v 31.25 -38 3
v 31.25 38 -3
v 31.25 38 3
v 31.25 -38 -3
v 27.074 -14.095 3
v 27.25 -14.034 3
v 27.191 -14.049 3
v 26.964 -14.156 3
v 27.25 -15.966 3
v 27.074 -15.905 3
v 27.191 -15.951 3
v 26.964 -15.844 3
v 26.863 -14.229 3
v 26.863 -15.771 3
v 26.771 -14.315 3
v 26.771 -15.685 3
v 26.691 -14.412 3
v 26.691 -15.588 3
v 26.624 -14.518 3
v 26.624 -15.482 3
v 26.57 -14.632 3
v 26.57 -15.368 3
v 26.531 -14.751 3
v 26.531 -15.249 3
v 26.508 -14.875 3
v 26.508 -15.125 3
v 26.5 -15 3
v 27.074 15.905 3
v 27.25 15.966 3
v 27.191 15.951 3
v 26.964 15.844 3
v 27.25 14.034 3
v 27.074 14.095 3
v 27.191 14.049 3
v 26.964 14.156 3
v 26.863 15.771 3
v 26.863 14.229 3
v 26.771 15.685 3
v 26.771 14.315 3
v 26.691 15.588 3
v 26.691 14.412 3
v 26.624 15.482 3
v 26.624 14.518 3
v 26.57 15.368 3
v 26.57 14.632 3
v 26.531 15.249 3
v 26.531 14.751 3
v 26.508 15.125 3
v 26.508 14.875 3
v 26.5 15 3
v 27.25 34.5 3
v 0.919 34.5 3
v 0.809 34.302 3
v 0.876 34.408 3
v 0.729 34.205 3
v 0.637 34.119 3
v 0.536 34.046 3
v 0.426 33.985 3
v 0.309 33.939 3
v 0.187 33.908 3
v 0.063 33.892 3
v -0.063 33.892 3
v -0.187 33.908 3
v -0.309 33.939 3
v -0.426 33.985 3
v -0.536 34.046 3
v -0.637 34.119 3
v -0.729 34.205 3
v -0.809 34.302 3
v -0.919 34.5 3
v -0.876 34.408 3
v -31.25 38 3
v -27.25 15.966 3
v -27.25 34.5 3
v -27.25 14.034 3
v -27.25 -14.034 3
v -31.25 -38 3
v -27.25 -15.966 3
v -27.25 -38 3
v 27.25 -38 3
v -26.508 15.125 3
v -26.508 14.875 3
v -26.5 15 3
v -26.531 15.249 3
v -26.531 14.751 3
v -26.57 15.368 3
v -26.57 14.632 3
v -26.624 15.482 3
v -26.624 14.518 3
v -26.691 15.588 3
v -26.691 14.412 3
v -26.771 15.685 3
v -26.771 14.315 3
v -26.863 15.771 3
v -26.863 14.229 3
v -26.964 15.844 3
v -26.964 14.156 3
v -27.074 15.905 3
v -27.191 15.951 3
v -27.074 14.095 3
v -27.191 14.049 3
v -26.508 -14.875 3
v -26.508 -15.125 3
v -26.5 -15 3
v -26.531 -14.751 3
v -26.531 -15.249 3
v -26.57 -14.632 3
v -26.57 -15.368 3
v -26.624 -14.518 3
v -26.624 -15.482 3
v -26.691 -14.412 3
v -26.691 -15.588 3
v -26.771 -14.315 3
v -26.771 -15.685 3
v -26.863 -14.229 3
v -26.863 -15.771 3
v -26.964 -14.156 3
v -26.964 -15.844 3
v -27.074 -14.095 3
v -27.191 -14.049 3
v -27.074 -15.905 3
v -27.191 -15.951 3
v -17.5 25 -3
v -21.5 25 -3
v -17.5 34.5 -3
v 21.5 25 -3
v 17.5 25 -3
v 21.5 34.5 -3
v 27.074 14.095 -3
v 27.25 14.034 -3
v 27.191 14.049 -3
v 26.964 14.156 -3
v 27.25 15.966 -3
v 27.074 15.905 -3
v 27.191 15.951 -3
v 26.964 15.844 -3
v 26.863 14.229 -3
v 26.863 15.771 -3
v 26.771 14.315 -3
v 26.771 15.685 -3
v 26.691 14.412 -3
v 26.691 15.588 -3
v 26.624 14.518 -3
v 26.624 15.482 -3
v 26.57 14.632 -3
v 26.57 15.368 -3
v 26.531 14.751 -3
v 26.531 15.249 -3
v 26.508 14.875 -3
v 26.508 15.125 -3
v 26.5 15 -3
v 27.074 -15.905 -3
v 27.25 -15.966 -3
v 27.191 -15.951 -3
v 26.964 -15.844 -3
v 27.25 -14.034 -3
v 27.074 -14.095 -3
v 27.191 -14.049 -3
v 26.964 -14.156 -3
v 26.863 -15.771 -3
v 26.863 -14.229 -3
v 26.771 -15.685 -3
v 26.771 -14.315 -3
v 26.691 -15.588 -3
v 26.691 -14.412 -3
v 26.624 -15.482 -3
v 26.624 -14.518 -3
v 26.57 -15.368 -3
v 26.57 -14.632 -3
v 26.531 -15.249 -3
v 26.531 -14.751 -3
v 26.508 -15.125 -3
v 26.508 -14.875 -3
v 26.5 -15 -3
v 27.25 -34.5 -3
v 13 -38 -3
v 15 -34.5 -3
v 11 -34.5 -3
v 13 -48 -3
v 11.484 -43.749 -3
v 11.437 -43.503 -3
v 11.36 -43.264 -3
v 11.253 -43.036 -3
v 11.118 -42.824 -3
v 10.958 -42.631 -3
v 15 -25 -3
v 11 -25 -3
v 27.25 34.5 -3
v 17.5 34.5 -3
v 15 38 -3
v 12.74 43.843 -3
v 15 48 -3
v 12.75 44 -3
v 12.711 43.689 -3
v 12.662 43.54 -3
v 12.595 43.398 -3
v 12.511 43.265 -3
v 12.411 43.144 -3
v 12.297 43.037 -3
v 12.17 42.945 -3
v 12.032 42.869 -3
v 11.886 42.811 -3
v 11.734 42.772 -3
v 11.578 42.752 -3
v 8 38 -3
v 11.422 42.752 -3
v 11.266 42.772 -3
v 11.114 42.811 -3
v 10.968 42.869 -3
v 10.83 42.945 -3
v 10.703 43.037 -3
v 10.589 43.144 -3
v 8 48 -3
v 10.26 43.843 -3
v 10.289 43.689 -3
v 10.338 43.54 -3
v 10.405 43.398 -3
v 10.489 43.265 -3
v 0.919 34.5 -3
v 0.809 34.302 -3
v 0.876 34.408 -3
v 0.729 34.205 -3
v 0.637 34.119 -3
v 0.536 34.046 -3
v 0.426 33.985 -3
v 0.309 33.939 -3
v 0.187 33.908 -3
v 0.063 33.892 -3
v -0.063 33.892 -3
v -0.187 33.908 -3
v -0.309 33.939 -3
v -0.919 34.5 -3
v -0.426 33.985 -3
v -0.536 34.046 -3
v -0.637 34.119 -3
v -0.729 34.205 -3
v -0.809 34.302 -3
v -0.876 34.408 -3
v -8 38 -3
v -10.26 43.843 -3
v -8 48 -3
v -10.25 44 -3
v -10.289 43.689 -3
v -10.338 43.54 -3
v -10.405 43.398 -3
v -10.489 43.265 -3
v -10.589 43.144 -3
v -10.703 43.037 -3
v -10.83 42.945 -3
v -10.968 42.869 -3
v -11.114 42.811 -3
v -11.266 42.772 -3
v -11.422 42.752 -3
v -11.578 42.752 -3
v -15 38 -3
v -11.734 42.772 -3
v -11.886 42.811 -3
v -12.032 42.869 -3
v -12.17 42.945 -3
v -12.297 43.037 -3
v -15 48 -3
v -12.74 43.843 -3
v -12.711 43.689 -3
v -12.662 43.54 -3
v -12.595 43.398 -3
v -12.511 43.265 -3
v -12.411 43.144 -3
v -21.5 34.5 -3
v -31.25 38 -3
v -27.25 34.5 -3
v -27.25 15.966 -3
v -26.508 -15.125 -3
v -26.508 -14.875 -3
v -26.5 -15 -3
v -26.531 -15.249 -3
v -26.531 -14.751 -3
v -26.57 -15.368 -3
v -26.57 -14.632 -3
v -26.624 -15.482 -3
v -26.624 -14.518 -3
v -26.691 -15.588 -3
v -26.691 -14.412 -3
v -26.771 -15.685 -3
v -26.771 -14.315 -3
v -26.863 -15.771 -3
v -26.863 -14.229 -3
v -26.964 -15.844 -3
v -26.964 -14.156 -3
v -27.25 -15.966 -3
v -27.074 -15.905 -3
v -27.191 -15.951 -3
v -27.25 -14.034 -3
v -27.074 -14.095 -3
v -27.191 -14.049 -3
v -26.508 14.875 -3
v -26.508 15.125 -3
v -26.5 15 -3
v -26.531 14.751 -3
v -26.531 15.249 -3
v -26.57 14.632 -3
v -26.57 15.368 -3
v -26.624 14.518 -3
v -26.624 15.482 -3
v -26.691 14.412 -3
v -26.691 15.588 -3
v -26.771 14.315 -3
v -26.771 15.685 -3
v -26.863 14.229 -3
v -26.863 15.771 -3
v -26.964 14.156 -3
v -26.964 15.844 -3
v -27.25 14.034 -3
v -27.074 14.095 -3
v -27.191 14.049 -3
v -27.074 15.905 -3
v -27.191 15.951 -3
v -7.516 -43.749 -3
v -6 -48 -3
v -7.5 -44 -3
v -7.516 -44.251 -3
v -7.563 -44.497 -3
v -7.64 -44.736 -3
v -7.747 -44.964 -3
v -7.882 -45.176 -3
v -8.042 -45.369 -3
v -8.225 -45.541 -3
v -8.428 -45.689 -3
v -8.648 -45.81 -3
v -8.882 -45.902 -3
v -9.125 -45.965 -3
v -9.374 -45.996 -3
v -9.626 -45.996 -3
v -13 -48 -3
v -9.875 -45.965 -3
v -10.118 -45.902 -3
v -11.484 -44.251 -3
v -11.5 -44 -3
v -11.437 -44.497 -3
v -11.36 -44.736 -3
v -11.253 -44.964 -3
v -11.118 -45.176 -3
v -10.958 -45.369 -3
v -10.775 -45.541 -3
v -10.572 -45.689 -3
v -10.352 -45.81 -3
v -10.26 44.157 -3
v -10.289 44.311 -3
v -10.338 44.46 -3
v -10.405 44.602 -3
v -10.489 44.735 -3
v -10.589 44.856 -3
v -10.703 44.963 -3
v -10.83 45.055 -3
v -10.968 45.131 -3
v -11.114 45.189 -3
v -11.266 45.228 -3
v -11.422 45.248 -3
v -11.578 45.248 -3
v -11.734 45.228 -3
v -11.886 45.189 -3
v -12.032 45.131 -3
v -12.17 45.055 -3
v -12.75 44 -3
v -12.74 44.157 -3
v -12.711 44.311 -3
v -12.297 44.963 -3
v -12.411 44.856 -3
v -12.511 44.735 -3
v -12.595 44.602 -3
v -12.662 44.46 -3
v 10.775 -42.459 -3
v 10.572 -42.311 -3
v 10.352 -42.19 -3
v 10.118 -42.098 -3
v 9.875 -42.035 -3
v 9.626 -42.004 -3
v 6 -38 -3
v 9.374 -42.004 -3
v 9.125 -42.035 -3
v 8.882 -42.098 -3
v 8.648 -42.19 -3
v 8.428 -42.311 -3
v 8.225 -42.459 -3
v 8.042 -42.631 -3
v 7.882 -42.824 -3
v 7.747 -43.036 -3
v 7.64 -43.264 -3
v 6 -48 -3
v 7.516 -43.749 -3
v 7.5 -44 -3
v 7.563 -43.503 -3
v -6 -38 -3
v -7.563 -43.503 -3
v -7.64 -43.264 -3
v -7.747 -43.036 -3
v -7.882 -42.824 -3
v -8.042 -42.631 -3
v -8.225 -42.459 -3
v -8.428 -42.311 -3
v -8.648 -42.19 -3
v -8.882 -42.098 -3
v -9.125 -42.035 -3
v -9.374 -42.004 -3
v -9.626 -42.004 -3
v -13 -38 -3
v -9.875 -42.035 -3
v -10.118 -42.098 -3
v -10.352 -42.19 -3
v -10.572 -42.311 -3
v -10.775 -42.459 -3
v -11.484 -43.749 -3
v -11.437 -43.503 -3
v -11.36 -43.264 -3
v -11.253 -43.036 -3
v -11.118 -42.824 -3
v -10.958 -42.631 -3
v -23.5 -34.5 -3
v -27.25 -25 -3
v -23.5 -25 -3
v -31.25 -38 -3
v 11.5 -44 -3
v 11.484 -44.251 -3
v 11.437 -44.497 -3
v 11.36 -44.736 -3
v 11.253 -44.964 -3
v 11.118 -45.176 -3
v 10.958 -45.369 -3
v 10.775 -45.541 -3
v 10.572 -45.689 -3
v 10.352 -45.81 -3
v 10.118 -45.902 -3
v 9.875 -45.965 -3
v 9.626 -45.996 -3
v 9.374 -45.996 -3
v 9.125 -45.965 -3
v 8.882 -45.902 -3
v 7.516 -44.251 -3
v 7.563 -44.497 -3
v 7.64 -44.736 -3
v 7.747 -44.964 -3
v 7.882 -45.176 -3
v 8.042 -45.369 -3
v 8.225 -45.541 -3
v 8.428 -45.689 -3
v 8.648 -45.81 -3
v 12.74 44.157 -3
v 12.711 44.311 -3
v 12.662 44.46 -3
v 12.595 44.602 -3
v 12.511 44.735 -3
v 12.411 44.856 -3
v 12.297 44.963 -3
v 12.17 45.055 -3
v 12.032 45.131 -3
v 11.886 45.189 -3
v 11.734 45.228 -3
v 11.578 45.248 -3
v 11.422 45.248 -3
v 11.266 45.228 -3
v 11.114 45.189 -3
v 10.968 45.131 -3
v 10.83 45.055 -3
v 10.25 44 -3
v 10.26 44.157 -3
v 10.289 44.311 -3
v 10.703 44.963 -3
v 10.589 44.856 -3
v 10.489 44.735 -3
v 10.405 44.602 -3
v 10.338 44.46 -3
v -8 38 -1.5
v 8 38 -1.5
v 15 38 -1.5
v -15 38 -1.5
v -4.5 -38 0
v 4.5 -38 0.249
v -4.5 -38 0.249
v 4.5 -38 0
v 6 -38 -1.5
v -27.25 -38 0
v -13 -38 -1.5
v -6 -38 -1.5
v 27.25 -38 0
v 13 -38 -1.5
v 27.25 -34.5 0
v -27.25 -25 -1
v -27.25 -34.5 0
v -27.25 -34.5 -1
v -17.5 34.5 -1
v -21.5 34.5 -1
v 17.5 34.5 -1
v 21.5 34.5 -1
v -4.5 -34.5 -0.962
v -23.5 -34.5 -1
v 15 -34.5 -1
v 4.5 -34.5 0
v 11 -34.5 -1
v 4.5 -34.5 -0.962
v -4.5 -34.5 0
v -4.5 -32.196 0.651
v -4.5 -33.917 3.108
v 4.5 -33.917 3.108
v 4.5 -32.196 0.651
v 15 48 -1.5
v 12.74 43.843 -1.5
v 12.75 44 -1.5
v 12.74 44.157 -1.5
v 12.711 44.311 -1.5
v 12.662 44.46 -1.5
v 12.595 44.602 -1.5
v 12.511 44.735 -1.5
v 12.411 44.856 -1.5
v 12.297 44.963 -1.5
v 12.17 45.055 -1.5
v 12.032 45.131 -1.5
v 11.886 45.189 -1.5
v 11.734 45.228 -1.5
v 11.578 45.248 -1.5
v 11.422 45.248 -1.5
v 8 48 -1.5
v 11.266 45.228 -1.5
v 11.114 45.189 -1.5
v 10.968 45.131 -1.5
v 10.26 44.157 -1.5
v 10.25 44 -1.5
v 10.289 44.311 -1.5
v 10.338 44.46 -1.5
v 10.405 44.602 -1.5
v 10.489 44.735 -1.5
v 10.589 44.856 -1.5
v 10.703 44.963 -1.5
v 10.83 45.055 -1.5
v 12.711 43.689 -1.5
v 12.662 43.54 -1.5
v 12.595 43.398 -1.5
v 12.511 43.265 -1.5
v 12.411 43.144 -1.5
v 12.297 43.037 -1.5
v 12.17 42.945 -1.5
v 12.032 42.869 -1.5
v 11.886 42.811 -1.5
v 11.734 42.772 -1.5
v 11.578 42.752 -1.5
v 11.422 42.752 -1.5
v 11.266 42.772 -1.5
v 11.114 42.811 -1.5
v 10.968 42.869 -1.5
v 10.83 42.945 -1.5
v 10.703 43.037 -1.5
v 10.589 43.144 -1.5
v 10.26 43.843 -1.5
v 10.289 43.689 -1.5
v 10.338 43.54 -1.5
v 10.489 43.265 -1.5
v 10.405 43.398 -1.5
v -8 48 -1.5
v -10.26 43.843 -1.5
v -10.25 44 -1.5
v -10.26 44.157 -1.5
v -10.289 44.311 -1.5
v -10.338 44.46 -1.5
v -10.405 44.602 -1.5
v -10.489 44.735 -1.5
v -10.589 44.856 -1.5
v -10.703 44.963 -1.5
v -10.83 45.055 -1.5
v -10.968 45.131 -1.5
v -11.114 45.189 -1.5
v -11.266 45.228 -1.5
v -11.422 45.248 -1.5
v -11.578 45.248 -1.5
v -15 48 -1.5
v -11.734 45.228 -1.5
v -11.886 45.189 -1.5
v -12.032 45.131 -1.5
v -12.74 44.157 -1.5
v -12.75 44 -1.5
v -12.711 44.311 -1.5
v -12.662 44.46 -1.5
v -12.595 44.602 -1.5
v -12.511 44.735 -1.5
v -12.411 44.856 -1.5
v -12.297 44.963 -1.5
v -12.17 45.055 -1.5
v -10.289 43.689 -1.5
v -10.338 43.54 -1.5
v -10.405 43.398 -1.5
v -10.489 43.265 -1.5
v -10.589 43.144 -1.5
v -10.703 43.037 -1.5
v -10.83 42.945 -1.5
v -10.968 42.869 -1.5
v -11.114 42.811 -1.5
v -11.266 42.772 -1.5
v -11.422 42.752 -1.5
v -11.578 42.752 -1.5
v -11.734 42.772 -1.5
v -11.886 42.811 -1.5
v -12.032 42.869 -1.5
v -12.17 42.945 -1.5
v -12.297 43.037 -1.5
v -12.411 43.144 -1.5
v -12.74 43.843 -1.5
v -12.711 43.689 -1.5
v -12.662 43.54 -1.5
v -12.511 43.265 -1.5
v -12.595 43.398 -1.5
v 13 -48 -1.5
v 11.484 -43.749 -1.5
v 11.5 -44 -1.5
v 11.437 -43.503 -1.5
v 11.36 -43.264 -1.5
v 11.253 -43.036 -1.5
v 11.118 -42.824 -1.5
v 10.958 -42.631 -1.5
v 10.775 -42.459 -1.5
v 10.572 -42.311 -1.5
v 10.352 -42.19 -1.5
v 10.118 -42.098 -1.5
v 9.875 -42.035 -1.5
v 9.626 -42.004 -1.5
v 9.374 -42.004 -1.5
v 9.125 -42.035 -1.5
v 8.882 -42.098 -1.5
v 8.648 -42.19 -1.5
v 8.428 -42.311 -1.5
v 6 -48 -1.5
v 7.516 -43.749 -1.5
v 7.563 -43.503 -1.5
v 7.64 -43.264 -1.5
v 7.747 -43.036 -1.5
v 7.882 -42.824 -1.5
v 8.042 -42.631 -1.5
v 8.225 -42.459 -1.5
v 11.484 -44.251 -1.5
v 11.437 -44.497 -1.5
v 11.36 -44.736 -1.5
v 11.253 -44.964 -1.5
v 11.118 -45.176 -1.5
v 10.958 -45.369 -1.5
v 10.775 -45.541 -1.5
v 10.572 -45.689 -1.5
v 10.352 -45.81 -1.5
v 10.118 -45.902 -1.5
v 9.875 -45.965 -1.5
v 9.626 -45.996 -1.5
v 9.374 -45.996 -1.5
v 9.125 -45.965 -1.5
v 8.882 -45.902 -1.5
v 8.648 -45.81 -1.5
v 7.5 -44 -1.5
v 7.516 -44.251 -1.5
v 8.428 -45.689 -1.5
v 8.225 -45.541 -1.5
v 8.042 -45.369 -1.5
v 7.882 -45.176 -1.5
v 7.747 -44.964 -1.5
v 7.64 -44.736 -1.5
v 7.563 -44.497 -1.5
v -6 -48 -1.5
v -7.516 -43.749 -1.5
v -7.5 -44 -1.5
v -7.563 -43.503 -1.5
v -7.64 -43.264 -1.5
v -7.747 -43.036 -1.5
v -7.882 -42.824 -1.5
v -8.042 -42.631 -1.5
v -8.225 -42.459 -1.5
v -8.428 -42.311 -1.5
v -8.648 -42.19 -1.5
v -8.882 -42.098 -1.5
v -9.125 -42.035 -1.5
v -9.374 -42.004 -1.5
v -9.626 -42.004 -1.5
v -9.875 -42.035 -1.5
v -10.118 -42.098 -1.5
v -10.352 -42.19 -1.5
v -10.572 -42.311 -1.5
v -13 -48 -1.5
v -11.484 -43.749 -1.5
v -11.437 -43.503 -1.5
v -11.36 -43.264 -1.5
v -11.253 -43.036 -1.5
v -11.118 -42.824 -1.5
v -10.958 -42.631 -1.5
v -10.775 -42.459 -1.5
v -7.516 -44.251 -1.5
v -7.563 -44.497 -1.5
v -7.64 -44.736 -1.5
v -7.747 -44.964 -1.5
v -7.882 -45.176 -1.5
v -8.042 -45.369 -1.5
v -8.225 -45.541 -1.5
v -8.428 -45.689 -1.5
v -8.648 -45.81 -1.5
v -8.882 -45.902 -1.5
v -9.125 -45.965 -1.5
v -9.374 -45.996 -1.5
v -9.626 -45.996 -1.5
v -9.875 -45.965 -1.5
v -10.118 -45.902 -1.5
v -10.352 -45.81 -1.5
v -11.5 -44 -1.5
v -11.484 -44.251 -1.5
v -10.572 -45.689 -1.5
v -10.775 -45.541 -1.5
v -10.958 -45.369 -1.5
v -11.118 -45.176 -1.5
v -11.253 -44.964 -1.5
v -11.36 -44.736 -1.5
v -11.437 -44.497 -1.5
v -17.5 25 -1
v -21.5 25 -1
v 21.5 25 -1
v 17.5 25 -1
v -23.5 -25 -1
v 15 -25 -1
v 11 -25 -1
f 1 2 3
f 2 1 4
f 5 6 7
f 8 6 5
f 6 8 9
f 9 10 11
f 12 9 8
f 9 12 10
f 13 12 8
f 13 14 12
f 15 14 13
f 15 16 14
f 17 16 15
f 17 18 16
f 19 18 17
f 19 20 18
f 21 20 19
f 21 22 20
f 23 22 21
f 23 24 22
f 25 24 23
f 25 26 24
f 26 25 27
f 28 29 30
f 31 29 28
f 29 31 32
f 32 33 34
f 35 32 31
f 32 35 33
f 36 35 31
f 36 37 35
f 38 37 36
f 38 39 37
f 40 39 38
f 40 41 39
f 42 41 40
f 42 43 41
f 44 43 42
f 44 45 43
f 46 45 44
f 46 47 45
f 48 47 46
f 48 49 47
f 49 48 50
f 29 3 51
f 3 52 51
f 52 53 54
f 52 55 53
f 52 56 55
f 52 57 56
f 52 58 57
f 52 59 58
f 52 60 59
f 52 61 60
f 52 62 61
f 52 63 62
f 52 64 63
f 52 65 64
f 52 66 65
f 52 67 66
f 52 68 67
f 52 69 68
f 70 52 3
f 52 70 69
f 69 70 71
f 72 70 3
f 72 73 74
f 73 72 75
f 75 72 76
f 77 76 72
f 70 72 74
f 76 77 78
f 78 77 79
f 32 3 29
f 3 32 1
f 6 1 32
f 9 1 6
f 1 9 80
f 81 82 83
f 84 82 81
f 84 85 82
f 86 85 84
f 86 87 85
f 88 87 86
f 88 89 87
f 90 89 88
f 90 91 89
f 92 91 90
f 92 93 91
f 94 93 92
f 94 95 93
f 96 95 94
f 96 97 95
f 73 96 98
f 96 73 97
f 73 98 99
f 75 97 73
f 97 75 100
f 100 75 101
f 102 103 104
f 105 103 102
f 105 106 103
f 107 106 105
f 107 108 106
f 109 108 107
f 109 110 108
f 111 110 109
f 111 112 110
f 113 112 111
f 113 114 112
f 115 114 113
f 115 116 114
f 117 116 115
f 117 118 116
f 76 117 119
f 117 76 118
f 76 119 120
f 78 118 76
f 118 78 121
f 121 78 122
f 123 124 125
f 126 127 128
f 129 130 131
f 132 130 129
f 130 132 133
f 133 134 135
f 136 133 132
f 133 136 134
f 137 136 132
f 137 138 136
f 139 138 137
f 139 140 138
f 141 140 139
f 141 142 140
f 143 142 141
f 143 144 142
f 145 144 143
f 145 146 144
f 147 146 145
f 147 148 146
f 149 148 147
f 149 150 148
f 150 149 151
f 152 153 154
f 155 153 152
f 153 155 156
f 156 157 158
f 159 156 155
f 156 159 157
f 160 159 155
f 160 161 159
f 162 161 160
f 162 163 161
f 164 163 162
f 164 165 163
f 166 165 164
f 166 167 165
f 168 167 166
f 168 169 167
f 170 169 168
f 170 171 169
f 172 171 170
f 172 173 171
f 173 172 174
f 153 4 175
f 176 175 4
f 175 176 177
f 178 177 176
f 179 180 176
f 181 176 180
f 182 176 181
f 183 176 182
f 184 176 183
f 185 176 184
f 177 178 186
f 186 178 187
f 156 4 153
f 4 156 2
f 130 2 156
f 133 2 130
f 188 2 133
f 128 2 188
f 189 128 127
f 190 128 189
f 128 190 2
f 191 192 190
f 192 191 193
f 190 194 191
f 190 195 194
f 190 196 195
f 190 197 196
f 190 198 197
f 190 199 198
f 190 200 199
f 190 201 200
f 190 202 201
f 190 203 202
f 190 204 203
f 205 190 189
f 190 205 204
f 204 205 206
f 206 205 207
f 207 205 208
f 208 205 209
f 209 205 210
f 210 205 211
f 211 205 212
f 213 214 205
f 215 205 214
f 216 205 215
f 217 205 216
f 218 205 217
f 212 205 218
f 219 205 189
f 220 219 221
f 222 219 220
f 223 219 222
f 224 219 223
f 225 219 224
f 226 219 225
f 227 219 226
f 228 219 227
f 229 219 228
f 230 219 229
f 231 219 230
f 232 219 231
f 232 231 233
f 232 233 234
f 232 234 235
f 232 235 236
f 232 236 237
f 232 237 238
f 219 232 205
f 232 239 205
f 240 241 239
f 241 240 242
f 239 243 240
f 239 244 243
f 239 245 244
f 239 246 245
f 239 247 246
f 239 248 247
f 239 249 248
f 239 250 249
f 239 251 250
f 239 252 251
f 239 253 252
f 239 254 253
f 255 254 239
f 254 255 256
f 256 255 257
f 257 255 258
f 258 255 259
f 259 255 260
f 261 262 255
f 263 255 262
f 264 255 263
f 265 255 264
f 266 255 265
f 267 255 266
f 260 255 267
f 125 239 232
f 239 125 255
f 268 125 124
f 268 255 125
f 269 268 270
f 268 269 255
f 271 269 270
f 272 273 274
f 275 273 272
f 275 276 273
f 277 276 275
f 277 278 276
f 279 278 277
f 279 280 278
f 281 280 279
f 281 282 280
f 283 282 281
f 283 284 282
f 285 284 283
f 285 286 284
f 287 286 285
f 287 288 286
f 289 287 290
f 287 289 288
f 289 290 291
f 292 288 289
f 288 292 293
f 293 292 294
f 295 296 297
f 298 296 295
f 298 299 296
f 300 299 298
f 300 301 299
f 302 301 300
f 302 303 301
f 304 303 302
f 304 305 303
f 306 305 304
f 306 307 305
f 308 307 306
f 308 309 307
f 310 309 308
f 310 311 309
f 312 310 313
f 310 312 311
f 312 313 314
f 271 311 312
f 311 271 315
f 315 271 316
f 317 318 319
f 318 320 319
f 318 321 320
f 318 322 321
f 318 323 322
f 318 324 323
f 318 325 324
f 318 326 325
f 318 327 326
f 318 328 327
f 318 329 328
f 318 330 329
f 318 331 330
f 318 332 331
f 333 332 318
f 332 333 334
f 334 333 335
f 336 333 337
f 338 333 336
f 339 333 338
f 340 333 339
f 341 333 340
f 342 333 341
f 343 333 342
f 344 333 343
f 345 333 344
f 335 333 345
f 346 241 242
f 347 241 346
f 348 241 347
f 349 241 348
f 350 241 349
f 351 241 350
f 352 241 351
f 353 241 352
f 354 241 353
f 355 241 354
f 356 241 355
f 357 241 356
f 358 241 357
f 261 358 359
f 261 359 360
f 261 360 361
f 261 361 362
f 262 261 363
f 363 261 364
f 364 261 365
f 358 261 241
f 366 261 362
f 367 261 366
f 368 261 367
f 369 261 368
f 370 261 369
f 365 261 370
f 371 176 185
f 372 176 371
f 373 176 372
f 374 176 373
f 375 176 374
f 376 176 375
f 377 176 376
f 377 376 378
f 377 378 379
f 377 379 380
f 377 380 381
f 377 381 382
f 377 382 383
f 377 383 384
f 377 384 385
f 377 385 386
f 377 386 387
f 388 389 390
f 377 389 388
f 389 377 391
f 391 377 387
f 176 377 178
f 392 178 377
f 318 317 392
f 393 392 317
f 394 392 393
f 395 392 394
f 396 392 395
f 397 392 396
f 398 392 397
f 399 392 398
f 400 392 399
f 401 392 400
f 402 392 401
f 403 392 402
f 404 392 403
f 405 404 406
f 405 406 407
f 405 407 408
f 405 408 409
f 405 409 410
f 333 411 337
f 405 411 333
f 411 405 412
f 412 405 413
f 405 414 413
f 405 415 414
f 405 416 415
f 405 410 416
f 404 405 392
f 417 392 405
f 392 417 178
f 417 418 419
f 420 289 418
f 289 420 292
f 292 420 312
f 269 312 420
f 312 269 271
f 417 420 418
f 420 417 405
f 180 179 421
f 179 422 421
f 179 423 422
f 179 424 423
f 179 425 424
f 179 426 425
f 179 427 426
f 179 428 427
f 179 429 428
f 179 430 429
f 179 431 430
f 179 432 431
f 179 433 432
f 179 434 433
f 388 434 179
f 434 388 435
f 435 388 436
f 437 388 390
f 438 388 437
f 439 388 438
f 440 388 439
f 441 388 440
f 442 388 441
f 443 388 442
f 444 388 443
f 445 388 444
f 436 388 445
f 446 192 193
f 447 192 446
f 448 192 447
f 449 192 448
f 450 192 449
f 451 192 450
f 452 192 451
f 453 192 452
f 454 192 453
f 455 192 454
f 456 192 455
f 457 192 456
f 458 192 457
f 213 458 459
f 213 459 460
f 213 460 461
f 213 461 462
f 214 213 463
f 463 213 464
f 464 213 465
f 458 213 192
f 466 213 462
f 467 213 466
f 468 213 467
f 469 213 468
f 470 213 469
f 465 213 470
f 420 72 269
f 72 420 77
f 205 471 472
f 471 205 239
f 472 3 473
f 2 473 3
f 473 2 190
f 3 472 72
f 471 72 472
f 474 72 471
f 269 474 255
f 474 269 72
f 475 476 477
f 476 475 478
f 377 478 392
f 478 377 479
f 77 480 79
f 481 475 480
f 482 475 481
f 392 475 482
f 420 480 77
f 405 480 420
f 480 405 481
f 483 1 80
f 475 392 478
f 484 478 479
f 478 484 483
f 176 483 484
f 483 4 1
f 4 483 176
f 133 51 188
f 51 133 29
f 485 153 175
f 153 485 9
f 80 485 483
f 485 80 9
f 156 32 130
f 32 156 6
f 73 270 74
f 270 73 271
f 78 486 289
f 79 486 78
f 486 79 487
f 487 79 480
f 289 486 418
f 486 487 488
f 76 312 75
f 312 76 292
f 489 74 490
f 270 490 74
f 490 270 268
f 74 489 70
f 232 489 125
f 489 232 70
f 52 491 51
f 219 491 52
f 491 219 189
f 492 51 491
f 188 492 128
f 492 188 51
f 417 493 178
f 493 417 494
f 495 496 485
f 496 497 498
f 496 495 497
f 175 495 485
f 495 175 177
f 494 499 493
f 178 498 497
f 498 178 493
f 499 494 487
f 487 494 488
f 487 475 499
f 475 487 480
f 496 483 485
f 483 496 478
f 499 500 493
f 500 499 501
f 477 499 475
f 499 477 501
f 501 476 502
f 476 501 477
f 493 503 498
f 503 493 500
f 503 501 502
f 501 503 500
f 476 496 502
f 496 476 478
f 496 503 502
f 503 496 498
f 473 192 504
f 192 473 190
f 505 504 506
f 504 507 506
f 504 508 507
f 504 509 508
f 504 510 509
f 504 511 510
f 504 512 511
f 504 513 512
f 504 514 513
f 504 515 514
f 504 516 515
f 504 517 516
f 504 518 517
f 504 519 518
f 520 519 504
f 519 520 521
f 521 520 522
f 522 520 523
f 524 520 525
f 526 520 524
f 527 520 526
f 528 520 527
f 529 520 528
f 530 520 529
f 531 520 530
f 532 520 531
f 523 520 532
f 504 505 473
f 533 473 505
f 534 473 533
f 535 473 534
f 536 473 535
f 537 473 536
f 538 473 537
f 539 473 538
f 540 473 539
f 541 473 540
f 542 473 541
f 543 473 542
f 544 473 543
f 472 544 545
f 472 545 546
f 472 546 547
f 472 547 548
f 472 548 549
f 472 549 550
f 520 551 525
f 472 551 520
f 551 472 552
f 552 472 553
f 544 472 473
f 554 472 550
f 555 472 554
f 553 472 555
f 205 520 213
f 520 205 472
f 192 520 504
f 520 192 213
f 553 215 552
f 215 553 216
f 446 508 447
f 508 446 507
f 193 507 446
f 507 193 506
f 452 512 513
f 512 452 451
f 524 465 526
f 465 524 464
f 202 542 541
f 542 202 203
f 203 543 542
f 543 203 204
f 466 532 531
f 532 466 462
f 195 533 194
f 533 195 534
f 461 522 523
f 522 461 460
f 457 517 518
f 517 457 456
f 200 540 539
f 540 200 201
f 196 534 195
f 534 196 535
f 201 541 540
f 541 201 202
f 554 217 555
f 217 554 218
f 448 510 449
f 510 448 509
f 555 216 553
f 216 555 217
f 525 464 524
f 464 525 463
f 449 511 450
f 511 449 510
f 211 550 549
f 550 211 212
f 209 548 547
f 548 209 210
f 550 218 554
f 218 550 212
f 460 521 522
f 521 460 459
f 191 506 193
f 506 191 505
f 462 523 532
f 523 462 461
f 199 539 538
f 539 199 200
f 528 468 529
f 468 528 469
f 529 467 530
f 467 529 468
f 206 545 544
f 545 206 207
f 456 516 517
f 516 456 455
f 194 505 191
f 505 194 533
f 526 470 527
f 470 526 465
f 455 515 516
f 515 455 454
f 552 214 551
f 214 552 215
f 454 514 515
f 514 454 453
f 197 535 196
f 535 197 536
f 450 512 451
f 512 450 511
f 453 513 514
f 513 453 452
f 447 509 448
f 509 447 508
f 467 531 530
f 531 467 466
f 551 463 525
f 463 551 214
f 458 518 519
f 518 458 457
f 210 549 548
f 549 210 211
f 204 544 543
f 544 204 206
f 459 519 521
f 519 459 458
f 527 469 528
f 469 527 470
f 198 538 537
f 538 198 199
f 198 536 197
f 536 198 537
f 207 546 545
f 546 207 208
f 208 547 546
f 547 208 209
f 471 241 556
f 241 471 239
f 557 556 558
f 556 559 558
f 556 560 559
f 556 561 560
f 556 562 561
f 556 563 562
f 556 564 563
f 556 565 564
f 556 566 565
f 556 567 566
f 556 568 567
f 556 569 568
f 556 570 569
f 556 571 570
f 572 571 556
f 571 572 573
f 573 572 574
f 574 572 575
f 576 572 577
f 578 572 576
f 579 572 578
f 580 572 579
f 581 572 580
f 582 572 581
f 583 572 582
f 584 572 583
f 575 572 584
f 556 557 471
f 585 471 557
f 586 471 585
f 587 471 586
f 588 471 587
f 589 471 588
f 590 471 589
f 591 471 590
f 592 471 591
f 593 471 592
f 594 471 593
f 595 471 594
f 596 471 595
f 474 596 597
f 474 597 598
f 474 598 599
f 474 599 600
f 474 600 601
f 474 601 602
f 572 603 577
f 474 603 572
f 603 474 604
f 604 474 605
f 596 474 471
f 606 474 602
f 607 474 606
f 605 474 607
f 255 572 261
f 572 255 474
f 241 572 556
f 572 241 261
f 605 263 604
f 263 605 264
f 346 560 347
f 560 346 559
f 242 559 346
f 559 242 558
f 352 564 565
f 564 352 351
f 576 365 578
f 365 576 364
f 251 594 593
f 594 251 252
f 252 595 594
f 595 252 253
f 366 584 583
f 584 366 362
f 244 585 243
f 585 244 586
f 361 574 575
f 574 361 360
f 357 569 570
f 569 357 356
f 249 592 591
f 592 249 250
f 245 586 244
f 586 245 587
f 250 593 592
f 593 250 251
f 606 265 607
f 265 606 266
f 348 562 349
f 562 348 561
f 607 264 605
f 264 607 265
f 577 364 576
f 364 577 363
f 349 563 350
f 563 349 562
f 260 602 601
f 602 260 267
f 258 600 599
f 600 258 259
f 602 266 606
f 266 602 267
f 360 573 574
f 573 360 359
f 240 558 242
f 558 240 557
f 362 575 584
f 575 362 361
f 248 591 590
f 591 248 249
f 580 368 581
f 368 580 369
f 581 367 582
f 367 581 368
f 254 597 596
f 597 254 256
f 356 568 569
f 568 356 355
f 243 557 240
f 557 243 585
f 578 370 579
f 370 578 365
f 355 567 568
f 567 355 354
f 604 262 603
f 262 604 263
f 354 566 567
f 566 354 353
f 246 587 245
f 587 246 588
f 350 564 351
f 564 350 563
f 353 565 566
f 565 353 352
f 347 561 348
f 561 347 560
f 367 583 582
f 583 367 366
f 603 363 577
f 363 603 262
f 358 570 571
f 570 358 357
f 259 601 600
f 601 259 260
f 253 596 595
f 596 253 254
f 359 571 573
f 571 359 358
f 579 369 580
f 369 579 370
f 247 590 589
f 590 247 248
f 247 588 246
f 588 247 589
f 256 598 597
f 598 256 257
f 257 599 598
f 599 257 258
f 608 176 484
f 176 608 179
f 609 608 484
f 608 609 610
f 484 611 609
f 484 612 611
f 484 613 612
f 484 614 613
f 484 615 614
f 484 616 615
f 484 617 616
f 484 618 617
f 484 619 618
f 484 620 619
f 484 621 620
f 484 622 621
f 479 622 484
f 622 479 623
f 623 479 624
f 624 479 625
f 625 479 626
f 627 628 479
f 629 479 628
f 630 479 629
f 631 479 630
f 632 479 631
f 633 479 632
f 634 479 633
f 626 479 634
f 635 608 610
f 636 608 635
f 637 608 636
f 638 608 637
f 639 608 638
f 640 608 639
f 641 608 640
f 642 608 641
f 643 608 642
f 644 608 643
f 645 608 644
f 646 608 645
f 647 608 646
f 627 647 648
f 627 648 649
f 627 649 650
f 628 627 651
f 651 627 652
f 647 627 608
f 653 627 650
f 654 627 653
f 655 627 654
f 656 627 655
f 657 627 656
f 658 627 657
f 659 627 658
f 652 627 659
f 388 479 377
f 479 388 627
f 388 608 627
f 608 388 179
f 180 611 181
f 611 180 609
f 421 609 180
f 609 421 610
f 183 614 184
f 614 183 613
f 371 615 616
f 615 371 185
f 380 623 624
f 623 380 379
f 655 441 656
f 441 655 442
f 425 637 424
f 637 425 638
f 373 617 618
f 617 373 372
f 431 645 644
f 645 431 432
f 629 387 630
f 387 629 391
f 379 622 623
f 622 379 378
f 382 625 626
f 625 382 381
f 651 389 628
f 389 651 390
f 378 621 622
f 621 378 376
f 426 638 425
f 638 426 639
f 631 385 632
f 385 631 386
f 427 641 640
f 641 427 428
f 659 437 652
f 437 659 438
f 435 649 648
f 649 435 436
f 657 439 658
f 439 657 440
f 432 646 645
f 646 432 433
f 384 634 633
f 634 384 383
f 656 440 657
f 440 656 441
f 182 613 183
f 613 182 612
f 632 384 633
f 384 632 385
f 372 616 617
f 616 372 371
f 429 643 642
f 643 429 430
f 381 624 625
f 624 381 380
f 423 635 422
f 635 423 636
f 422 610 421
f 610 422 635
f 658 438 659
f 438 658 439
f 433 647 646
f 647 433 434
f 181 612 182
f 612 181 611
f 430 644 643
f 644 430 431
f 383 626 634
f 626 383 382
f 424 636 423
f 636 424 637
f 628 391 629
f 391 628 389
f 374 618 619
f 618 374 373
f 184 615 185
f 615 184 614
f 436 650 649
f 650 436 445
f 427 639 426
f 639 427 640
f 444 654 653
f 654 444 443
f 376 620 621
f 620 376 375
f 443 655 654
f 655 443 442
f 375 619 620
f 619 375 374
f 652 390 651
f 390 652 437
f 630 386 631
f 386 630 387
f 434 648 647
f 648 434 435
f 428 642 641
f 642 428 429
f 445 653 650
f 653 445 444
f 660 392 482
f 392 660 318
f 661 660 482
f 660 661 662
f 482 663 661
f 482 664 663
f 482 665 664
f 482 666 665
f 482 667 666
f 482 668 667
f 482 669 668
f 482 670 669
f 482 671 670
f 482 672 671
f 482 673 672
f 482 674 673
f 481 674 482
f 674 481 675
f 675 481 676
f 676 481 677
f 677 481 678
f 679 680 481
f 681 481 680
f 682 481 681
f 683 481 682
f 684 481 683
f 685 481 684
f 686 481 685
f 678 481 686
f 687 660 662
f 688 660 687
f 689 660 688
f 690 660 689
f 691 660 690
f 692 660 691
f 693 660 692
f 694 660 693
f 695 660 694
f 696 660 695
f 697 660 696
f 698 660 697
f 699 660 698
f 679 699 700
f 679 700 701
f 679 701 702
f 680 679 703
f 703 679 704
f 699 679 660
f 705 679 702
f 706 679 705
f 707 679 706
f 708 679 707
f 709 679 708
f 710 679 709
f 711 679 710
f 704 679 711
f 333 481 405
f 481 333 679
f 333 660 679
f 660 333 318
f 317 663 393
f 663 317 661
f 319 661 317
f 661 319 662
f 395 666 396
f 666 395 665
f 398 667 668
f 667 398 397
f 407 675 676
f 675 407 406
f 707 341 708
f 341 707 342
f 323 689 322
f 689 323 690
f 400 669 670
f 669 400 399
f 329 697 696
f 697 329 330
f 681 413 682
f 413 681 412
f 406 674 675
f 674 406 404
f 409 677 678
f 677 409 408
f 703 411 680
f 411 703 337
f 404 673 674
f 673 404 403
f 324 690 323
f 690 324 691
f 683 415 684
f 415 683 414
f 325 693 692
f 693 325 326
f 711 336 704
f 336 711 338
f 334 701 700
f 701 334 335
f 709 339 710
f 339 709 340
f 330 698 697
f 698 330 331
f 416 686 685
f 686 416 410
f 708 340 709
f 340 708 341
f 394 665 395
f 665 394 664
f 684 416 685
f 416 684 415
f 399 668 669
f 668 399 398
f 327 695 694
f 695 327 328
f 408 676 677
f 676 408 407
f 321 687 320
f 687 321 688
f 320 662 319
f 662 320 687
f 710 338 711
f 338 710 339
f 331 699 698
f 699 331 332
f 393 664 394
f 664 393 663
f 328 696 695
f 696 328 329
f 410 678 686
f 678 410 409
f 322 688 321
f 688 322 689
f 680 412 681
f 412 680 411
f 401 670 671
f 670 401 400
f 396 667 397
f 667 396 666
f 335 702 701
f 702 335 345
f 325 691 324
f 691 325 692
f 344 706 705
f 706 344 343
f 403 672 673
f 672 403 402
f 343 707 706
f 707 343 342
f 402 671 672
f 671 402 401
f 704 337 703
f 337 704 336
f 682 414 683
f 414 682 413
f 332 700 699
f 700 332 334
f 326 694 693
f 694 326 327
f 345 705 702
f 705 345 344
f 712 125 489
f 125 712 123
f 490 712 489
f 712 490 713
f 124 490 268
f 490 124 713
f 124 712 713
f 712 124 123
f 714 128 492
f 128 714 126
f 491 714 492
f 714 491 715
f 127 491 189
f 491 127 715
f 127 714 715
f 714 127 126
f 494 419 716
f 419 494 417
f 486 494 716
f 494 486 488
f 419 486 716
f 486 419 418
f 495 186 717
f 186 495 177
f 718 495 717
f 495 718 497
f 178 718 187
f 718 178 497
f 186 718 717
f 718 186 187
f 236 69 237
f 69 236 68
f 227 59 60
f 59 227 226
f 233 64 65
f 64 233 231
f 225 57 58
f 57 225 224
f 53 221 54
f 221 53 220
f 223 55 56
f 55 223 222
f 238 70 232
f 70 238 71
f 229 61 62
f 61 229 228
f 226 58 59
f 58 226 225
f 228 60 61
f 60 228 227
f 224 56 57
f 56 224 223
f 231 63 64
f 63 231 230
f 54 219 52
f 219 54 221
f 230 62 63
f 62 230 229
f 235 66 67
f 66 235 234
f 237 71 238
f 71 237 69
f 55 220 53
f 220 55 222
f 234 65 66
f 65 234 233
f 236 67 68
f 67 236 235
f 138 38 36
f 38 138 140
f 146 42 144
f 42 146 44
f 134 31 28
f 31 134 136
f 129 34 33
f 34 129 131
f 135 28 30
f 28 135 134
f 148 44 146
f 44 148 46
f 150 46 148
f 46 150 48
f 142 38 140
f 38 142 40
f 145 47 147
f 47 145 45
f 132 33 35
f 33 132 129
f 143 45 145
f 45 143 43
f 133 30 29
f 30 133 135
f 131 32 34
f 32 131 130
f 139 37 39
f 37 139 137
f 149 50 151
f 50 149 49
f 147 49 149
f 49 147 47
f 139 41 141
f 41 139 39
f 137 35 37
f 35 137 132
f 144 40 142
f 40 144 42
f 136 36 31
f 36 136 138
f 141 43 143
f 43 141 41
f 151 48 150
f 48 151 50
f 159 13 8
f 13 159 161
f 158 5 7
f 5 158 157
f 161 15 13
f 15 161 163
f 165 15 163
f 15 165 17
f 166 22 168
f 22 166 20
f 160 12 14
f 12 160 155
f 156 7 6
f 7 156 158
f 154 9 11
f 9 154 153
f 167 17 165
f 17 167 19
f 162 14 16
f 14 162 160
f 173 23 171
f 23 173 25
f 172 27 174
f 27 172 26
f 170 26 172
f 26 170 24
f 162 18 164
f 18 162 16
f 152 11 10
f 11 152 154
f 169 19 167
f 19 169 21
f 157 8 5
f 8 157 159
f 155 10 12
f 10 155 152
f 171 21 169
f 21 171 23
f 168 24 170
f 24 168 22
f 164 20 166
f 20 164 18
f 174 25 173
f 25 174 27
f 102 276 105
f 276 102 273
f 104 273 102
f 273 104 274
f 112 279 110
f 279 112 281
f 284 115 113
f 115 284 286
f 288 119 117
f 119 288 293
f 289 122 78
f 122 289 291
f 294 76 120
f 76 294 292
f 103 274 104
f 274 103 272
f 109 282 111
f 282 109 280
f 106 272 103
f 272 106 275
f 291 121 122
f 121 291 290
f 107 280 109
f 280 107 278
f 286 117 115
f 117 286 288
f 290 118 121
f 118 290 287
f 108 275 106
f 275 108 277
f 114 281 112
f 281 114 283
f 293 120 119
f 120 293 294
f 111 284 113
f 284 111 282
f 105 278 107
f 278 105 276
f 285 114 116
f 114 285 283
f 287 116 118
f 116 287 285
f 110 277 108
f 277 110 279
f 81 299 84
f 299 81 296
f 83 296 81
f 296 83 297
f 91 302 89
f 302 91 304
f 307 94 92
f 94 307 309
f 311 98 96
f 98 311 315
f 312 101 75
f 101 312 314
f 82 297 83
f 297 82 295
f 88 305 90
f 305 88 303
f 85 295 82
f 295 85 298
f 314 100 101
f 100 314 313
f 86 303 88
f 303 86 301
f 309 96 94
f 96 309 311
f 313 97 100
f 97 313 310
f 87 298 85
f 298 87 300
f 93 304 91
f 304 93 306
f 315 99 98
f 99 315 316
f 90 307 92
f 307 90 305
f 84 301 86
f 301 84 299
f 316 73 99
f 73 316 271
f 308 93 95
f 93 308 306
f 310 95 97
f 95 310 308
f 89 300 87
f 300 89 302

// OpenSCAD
// Base Arduino Carrinho
//
// (c) 2014 Afonso Coutinho <afonso@yack.com.br>
//
// This program is free software: you can redistribute it and/or modify
// it under the terms of the GNU General Public License as published by
// the Free Software Foundation, either version 2 of the License, or
// (at your option) any later version.
//
// This program is distributed in the hope that it will be useful,
// but WITHOUT ANY WARRANTY; without even the implied warranty of
// MERCHANTABILITY or FITNESS FOR A PARTICULAR PURPOSE.  See the
// GNU General Public License for more details.
//
// You should have received a copy of the GNU General Public License
// along with this program.  If not, see <http://www.gnu.org/licenses/>.

$fn = 50;
difference(){
	cube([62.5, 76, 6], center = true);
	translate([0, 0, 0]){
		cube([54.5, 69, 12], center = true);
	}
	translate([0, -36, 6]){
		cube([54.5, 6, 12], center = true);
	}
}

translate([-19.5, 30, -2]){
	cube([4, 10, 2], center = true);
}
translate([19.5, 30, -2]){
	cube([4, 10, 2], center = true);
}
translate([-25.5, -30, -2]){
	cube([4, 10, 2], center = true);
}
translate([13, -30, -2]){
	cube([4, 10, 2], center = true);
}
difference(){
	rotate([35,0,0]){
		translate([0, -29, 20.5]){
			cube([9, 6, 3], center = true);
		}
	}
	translate([0, -40.5, 0]){
		cube([10, 5, 10], center = true);
	}
}
translate([0, 34.89, 0]){
	cylinder(r = 1, h = 6, center = true);
}
translate([27.5, 15, 0]){
	cylinder(r = 1, h = 6, center = true);
}
translate([27.5, -15, 0]){
	cylinder(r = 1, h = 6, center = true);
}
translate([-27.5, -15, 0]){
	cylinder(r = 1, h = 6, center = true);
}
translate([-27.5, 15, 0]){
	cylinder(r = 1, h = 6, center = true);
}

translate([11.5, 42.5, -2.25]){
	difference(){
		cube([7,11,1.5], center = true);
		translate([0, 1.5, 0]){
			#cylinder(r = 1.25, h = 10, center = true);
		}
	}
}
translate([-11.5, 42.5, -2.25]){
	difference(){
		cube([7,11,1.5], center = true);
		translate([0, 1.5, 0]){
			#cylinder(r = 1.25, h = 10, center = true);
		}
	}
}
translate([9.5, -42.5, -2.25]){
	difference(){
		cube([7,11,1.5], center = true);
		translate([0, -1.5, 0]){
			#cylinder(r = 2, h = 10, center = true);
		}
	}
}
translate([-9.5, -42.5, -2.25]){
	difference(){
		cube([7,11,1.5], center = true);
		translate([0, -1.5, 0]){
			#cylinder(r = 2, h = 10, center = true);
		}
	}
}
